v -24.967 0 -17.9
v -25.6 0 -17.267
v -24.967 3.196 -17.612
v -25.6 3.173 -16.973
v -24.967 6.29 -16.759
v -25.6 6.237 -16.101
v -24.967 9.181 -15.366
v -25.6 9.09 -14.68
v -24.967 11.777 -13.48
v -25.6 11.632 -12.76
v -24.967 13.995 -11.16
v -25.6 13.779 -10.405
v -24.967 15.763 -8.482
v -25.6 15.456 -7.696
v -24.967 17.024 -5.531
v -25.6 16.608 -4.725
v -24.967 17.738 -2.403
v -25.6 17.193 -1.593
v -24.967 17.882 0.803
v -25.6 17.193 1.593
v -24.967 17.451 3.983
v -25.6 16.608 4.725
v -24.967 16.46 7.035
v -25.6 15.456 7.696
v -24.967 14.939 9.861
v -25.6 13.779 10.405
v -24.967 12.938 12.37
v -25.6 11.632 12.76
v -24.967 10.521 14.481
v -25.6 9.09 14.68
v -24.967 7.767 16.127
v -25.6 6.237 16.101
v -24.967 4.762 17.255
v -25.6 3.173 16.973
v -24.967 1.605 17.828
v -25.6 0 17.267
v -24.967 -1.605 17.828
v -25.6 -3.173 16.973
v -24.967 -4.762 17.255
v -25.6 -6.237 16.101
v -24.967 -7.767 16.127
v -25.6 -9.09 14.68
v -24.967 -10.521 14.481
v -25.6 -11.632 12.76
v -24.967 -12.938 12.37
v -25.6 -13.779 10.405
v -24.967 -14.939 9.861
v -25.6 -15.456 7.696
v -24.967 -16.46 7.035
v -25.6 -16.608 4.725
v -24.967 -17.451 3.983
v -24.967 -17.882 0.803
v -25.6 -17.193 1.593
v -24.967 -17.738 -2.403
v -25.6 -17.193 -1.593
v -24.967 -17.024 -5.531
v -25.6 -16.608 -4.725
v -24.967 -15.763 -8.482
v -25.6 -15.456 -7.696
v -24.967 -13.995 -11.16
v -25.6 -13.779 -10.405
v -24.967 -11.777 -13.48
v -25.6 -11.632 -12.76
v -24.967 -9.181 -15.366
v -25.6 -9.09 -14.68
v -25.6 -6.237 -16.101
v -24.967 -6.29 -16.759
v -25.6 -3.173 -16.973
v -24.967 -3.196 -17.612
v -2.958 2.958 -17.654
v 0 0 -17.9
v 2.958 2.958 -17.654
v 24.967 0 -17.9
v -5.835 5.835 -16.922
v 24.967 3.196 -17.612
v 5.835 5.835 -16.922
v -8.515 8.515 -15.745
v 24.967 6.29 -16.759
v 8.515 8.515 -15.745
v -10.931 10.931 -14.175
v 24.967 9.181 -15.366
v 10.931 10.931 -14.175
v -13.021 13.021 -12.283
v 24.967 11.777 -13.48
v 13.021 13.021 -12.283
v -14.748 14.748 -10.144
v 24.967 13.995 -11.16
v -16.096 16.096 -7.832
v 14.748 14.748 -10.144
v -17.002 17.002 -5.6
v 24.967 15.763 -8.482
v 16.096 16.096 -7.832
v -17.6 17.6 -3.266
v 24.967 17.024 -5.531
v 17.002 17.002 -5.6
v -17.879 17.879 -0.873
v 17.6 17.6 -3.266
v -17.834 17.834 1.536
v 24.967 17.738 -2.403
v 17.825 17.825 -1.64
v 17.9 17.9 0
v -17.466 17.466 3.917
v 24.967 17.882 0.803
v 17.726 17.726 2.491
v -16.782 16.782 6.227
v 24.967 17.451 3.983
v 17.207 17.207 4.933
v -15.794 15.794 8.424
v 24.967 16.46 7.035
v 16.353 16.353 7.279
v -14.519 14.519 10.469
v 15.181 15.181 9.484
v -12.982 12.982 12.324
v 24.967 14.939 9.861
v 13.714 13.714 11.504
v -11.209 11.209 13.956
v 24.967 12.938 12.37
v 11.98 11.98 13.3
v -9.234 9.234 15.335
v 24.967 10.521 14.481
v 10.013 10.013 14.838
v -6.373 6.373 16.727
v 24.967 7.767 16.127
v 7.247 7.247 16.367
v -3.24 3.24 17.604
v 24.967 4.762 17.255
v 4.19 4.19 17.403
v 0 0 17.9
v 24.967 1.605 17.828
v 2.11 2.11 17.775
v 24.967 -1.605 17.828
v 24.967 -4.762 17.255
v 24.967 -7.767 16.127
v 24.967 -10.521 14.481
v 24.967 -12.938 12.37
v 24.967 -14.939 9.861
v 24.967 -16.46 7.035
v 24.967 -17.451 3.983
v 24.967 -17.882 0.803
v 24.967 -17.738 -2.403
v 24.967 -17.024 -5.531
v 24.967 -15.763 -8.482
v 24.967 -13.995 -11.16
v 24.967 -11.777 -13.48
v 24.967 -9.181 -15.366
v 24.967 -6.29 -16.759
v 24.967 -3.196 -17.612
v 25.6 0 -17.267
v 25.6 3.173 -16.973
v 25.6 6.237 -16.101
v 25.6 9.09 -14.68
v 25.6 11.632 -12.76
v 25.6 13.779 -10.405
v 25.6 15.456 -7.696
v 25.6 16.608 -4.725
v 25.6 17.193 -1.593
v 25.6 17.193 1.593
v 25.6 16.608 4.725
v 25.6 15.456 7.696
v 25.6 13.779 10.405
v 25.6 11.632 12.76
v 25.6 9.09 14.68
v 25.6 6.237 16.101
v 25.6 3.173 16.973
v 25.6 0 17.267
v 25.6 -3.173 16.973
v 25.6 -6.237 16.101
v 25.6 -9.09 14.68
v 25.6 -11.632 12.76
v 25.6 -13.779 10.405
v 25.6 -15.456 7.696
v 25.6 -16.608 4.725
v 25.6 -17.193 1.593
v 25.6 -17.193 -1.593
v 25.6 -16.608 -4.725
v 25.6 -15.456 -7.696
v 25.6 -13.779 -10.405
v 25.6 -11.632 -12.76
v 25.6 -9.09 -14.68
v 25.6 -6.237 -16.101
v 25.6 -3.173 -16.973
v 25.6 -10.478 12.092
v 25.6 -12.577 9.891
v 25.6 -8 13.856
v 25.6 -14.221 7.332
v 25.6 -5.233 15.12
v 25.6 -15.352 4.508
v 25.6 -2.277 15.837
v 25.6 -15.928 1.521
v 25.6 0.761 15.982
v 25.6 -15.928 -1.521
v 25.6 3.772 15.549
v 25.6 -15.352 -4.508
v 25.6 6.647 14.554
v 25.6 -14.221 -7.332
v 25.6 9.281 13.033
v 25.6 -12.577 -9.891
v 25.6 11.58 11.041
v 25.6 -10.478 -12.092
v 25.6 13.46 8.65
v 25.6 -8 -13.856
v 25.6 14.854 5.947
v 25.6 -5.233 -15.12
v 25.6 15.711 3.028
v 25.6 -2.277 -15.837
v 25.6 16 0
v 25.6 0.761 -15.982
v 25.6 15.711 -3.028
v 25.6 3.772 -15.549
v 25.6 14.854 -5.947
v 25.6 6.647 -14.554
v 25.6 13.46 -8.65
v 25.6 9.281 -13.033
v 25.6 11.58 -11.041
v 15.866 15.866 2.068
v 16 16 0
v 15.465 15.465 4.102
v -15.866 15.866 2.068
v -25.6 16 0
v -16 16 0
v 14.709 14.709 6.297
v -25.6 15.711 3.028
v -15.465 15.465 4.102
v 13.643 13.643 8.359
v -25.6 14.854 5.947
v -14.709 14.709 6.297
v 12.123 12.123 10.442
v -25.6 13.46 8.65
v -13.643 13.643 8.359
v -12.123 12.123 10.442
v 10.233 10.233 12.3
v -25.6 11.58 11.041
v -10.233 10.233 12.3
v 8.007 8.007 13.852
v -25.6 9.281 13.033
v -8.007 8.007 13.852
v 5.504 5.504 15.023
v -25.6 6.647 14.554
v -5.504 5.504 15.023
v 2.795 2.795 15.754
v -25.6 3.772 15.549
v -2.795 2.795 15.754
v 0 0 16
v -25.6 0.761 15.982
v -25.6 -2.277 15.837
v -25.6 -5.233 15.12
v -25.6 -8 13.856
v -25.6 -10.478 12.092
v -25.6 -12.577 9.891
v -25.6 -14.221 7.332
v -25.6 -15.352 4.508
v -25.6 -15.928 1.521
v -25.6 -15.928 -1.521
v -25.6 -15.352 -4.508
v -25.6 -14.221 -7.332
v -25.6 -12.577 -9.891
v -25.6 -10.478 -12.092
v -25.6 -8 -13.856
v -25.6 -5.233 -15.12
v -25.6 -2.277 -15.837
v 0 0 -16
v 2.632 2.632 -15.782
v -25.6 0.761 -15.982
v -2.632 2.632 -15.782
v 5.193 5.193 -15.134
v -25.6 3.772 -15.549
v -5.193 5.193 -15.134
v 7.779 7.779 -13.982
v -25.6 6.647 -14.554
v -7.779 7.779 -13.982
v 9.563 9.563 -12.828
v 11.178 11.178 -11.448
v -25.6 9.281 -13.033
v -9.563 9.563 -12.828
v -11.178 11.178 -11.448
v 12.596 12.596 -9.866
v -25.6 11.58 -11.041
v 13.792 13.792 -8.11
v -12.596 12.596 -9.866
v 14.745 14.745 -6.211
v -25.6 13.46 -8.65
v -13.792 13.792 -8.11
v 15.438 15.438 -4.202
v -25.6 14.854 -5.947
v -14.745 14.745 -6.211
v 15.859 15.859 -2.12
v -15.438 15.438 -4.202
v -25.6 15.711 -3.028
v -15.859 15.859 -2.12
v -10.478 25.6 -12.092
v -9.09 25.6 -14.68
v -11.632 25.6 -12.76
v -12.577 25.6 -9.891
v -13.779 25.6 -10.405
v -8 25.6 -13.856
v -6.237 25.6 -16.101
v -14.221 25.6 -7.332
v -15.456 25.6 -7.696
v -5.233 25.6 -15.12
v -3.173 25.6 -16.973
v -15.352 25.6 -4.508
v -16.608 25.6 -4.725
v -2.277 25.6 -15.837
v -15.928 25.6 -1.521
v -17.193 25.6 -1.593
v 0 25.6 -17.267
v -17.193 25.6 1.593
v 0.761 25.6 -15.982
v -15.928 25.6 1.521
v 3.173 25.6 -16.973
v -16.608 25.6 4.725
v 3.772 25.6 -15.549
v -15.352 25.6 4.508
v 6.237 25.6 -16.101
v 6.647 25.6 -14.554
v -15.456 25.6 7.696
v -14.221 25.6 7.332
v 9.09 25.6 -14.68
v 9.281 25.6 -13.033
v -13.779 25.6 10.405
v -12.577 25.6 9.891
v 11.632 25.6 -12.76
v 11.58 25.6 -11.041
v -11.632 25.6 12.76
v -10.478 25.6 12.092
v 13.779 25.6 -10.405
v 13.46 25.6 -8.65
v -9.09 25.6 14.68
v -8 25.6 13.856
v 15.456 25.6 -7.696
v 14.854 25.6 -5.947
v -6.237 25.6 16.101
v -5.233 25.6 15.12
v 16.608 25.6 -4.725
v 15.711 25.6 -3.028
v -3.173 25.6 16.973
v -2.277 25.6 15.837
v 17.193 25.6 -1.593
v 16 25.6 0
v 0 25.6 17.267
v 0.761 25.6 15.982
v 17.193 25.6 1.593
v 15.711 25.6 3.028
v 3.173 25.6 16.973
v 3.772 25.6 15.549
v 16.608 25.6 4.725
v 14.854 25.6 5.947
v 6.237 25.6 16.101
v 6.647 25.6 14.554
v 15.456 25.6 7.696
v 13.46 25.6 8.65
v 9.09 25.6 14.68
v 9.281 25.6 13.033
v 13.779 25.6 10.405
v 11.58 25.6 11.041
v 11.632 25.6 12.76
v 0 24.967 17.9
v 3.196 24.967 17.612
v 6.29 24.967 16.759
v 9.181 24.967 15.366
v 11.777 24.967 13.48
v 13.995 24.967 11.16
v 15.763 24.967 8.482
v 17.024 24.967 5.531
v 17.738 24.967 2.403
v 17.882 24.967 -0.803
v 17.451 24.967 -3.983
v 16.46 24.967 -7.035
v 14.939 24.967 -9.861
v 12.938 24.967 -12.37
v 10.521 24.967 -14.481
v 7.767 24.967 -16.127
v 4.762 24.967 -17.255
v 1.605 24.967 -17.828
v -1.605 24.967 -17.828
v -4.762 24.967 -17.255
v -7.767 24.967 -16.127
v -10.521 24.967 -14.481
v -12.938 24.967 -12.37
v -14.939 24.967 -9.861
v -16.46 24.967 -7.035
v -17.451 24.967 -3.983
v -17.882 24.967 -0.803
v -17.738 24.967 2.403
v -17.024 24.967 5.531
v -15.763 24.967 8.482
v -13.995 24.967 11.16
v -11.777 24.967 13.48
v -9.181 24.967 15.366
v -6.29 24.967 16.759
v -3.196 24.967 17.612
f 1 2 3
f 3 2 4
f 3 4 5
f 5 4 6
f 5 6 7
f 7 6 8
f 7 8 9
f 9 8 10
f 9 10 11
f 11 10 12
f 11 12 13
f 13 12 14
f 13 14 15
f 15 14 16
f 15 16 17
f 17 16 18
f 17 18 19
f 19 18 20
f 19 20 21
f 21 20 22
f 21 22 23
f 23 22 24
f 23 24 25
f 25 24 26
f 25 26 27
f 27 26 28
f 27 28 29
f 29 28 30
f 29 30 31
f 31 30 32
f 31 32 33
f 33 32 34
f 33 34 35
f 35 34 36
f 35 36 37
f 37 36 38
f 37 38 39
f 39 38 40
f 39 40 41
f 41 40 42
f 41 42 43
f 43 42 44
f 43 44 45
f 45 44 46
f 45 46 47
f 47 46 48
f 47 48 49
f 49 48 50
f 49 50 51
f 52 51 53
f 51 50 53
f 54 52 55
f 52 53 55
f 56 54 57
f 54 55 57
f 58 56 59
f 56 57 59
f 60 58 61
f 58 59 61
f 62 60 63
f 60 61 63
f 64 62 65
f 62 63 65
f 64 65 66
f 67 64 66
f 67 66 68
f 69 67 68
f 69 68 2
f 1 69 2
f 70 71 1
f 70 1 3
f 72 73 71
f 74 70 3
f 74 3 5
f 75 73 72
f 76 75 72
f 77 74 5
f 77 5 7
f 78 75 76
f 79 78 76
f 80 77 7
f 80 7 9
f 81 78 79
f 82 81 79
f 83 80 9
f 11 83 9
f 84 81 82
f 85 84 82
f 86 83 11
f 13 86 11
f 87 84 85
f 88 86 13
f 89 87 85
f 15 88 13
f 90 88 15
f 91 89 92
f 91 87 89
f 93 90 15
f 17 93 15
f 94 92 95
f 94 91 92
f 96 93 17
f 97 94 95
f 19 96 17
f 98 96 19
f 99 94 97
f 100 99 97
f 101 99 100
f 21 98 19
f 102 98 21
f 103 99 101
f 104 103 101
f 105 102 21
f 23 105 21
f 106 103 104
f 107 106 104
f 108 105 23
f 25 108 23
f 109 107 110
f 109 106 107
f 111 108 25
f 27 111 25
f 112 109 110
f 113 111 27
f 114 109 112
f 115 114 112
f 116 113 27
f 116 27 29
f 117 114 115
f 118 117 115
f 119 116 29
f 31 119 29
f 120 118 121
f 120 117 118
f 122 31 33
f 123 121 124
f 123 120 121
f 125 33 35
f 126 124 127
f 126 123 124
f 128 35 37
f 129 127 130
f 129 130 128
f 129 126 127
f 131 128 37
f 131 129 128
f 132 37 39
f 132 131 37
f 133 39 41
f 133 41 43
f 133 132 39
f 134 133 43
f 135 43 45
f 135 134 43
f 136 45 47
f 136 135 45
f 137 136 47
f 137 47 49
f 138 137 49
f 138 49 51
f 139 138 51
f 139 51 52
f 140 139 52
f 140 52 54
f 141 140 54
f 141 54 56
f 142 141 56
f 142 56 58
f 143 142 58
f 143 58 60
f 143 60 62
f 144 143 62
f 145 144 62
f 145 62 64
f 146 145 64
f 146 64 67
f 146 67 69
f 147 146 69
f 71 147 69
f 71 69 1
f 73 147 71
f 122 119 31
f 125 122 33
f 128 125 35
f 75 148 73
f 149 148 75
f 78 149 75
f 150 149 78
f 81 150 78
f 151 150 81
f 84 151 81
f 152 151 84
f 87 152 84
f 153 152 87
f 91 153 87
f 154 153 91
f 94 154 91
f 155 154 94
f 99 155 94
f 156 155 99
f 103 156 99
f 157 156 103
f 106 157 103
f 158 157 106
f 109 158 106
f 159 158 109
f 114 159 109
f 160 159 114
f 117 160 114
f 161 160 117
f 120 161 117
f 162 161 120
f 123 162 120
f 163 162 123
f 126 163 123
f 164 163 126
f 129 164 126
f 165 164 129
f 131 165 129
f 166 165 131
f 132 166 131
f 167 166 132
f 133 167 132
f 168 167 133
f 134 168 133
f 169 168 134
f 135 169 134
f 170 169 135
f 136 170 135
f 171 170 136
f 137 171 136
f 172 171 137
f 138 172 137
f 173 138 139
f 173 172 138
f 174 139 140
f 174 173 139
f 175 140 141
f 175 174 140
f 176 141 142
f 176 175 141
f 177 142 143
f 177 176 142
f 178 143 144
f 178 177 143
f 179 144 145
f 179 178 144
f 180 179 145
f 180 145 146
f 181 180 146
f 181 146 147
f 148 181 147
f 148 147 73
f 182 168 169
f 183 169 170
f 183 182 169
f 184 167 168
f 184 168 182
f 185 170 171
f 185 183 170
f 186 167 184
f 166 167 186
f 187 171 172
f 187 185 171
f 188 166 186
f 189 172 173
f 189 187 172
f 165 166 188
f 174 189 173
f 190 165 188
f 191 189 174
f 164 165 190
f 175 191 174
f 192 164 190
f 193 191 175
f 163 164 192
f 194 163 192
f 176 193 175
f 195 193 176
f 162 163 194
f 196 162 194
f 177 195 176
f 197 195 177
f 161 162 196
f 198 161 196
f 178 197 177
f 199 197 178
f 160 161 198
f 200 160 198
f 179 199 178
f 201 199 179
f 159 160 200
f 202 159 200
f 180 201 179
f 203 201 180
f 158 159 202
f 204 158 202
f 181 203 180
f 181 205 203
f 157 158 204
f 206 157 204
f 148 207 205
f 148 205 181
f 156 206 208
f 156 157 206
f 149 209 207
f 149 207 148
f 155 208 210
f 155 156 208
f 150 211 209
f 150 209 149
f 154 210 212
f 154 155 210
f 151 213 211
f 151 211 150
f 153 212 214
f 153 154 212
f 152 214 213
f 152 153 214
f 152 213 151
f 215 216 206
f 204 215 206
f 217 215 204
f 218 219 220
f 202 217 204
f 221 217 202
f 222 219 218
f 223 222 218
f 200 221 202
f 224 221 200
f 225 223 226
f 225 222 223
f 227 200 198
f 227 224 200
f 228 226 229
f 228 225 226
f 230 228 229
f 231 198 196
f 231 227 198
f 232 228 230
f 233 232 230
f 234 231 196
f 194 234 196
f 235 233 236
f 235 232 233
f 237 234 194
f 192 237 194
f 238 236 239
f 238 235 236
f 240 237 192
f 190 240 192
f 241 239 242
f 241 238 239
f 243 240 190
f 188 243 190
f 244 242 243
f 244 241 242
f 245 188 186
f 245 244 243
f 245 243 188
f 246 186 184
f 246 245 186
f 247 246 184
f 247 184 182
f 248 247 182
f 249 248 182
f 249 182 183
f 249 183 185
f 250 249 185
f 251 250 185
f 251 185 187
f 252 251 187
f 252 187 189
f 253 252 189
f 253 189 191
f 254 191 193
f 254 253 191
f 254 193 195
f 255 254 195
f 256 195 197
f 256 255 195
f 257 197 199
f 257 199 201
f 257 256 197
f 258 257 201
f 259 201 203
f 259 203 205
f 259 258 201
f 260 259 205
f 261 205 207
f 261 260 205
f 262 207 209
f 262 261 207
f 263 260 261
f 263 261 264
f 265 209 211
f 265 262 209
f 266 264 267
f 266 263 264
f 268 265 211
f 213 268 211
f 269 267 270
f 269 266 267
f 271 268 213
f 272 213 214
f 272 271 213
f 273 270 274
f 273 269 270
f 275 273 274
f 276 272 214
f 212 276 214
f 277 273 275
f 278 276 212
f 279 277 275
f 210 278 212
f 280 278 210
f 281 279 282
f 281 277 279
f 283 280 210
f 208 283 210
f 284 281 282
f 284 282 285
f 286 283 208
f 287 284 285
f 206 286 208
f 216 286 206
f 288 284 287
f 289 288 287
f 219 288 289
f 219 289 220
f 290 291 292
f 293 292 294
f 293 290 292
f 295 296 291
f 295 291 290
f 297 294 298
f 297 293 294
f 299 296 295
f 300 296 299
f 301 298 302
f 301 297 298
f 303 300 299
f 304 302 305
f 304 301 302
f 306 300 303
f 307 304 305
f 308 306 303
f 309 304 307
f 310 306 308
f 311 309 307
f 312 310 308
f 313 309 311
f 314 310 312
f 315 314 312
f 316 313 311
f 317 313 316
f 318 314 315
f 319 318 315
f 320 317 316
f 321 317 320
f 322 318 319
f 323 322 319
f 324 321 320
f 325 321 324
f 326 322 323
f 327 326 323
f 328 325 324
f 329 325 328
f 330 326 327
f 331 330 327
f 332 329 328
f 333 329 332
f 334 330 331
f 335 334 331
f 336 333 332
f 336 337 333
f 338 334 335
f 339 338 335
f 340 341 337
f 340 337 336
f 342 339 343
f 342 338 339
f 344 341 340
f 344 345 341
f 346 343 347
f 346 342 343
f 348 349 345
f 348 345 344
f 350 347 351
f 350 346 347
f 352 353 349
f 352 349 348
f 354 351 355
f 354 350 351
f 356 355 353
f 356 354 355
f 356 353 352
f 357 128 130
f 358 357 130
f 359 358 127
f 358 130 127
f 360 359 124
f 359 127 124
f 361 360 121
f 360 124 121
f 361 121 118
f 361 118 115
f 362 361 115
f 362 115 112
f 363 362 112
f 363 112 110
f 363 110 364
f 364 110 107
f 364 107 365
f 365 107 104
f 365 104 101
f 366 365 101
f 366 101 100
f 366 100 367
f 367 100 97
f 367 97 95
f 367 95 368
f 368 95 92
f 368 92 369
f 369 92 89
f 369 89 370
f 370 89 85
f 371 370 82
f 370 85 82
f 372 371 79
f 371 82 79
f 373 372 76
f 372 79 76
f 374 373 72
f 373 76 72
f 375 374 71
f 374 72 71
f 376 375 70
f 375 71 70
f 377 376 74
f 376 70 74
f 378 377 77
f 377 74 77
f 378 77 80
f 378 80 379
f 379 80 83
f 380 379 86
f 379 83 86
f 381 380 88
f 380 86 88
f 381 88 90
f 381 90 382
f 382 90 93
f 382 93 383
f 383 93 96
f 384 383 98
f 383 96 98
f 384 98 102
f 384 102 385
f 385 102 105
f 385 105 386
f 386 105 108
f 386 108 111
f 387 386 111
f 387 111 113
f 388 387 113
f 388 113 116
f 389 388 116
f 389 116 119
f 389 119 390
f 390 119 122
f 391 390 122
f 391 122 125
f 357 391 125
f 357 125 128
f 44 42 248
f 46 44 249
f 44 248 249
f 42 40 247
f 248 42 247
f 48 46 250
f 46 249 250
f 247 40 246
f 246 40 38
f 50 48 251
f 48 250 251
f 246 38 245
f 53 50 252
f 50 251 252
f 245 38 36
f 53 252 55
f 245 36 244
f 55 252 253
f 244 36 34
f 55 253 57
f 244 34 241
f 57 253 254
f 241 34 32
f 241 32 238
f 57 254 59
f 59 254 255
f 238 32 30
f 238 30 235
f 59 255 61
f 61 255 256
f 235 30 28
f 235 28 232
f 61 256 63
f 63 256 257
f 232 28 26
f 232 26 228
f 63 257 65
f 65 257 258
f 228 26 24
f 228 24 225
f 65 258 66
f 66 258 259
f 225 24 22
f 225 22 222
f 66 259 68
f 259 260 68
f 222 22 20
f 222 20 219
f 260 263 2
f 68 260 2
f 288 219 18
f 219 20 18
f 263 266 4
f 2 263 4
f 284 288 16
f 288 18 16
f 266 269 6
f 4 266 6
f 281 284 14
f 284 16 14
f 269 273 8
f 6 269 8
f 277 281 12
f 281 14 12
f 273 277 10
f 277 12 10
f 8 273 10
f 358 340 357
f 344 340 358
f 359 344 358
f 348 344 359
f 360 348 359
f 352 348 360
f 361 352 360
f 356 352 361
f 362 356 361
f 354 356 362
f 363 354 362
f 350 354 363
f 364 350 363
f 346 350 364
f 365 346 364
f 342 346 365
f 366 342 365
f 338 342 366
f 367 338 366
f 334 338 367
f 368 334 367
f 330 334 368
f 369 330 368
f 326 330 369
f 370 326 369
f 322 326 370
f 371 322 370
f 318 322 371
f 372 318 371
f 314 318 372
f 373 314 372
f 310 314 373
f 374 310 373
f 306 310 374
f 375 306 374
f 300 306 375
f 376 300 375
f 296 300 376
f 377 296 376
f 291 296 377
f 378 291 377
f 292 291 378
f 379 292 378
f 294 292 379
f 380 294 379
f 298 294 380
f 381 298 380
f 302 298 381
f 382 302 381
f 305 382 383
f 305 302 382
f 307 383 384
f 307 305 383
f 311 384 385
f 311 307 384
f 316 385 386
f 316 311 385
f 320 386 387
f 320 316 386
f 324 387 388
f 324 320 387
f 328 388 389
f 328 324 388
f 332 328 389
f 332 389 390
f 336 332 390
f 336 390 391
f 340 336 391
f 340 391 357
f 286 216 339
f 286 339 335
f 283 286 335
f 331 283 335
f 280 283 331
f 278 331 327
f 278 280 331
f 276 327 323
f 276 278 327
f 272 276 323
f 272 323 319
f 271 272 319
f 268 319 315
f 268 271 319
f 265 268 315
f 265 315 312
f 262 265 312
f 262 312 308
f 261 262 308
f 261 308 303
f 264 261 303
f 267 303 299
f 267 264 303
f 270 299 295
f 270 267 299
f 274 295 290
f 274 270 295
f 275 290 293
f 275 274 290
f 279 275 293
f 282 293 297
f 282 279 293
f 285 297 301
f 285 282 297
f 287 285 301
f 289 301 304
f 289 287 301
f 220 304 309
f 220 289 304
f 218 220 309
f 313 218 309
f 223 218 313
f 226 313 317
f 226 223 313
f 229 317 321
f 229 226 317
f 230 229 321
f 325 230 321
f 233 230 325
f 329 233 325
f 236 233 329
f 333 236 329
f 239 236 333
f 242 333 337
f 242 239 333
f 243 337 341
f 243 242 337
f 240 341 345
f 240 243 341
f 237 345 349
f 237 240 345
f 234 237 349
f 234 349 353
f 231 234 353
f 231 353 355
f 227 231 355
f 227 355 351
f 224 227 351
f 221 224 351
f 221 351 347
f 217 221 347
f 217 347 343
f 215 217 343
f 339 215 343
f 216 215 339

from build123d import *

# Parameters (mm, degrees)
RUNROUTE_R           = 17.9
RUNEXTRUDE_DEPTH     = 25.6
OUTLETROUTE_R        = 17.9
OUTLETEXTRUDE_DEPTH  = 25.6
TEESHELL_START       = -25.6
TEESHELL_OUTLINE_R   = 16
TEESHELL_DEPTH       = 51.2
TEESHELL_START_2     = -1e-07
TEESHELL_2_OUTLINE_R = 16
TEESHELL_2_DEPTH     = 25.6000001
TEECHAMFER_SIZE      = 0.633333333


with BuildPart() as part:
    # RunRoute → RunExtrude (new body)
    with BuildSketch(Plane(origin=(0, 0, 0), x_dir=(0, 0, -1), z_dir=(1, 0, 0))):
        Circle(RUNROUTE_R)
    runextrude = extrude(amount=RUNEXTRUDE_DEPTH)

    # RunExtrudeMirror: RunExtrude across plane
    add(runextrude.mirror(Plane(origin=(0, 0, 0), x_dir=(0, 0, 1), z_dir=(1, 0, 0))))

    # OutletRoute → OutletExtrude (add)
    with BuildSketch(Plane(origin=(0, 0, 0), x_dir=(1, 0, 0), z_dir=(0, 1, 0))):
        with Locations(Location((0, 0, 0), (0, 0, 270))):
            Circle(OUTLETROUTE_R)
    extrude(amount=OUTLETEXTRUDE_DEPTH)

    # TeeShell: read off the stored shape, not the designer's step
    # TeeShell outline → TeeShell (cut)
    with BuildSketch(Plane.YZ.offset(TEESHELL_START)):
        Circle(TEESHELL_OUTLINE_R)
    extrude(amount=TEESHELL_DEPTH, mode=Mode.SUBTRACT)

    # TeeShell 2 outline → TeeShell 2 (cut)
    with BuildSketch(Plane(origin=(0, 0, 0), x_dir=(1, 0, 0), z_dir=(0, 1, 0)).offset(TEESHELL_START_2)):
        Circle(TEESHELL_2_OUTLINE_R)
    extrude(amount=TEESHELL_2_DEPTH, mode=Mode.SUBTRACT)

    # TeeChamfer
    # the kernel refuses this chamfer: 0.633333333 mm, written as the material it takes off along each edge
    with BuildSketch(Plane(origin=(25.6, 0, 0), x_dir=(0, 0, -1), z_dir=(0, -1, 0))) as teechamfer_piece_1:
        Polygon((17.9, -TEECHAMFER_SIZE), (17.9 - TEECHAMFER_SIZE, 0), (17.9, 0), align=None)
    revolve(axis=Axis((25.6, 0, 0), (1, 0, 0)), mode=Mode.SUBTRACT)
    with BuildSketch(Plane(origin=(-25.6, 0, 0), x_dir=(0, 0, -1), z_dir=(0, -1, 0))) as teechamfer_piece_2:
        Polygon((17.9, TEECHAMFER_SIZE), (17.9 - TEECHAMFER_SIZE, 0), (17.9, 0), align=None)
    revolve(axis=Axis((-25.6, 0, 0), (1, 0, 0)), mode=Mode.SUBTRACT)
    with BuildSketch(Plane(origin=(0, 25.6, 0), x_dir=(0, 0, 1), z_dir=(-1, 0, 0))) as teechamfer_piece_3:
        Polygon((17.9, -TEECHAMFER_SIZE), (17.9 - TEECHAMFER_SIZE, 0), (17.9, 0), align=None)
    revolve(axis=Axis((0, 25.6, 0), (0, 1, 0)), mode=Mode.SUBTRACT)


solid = part.part
